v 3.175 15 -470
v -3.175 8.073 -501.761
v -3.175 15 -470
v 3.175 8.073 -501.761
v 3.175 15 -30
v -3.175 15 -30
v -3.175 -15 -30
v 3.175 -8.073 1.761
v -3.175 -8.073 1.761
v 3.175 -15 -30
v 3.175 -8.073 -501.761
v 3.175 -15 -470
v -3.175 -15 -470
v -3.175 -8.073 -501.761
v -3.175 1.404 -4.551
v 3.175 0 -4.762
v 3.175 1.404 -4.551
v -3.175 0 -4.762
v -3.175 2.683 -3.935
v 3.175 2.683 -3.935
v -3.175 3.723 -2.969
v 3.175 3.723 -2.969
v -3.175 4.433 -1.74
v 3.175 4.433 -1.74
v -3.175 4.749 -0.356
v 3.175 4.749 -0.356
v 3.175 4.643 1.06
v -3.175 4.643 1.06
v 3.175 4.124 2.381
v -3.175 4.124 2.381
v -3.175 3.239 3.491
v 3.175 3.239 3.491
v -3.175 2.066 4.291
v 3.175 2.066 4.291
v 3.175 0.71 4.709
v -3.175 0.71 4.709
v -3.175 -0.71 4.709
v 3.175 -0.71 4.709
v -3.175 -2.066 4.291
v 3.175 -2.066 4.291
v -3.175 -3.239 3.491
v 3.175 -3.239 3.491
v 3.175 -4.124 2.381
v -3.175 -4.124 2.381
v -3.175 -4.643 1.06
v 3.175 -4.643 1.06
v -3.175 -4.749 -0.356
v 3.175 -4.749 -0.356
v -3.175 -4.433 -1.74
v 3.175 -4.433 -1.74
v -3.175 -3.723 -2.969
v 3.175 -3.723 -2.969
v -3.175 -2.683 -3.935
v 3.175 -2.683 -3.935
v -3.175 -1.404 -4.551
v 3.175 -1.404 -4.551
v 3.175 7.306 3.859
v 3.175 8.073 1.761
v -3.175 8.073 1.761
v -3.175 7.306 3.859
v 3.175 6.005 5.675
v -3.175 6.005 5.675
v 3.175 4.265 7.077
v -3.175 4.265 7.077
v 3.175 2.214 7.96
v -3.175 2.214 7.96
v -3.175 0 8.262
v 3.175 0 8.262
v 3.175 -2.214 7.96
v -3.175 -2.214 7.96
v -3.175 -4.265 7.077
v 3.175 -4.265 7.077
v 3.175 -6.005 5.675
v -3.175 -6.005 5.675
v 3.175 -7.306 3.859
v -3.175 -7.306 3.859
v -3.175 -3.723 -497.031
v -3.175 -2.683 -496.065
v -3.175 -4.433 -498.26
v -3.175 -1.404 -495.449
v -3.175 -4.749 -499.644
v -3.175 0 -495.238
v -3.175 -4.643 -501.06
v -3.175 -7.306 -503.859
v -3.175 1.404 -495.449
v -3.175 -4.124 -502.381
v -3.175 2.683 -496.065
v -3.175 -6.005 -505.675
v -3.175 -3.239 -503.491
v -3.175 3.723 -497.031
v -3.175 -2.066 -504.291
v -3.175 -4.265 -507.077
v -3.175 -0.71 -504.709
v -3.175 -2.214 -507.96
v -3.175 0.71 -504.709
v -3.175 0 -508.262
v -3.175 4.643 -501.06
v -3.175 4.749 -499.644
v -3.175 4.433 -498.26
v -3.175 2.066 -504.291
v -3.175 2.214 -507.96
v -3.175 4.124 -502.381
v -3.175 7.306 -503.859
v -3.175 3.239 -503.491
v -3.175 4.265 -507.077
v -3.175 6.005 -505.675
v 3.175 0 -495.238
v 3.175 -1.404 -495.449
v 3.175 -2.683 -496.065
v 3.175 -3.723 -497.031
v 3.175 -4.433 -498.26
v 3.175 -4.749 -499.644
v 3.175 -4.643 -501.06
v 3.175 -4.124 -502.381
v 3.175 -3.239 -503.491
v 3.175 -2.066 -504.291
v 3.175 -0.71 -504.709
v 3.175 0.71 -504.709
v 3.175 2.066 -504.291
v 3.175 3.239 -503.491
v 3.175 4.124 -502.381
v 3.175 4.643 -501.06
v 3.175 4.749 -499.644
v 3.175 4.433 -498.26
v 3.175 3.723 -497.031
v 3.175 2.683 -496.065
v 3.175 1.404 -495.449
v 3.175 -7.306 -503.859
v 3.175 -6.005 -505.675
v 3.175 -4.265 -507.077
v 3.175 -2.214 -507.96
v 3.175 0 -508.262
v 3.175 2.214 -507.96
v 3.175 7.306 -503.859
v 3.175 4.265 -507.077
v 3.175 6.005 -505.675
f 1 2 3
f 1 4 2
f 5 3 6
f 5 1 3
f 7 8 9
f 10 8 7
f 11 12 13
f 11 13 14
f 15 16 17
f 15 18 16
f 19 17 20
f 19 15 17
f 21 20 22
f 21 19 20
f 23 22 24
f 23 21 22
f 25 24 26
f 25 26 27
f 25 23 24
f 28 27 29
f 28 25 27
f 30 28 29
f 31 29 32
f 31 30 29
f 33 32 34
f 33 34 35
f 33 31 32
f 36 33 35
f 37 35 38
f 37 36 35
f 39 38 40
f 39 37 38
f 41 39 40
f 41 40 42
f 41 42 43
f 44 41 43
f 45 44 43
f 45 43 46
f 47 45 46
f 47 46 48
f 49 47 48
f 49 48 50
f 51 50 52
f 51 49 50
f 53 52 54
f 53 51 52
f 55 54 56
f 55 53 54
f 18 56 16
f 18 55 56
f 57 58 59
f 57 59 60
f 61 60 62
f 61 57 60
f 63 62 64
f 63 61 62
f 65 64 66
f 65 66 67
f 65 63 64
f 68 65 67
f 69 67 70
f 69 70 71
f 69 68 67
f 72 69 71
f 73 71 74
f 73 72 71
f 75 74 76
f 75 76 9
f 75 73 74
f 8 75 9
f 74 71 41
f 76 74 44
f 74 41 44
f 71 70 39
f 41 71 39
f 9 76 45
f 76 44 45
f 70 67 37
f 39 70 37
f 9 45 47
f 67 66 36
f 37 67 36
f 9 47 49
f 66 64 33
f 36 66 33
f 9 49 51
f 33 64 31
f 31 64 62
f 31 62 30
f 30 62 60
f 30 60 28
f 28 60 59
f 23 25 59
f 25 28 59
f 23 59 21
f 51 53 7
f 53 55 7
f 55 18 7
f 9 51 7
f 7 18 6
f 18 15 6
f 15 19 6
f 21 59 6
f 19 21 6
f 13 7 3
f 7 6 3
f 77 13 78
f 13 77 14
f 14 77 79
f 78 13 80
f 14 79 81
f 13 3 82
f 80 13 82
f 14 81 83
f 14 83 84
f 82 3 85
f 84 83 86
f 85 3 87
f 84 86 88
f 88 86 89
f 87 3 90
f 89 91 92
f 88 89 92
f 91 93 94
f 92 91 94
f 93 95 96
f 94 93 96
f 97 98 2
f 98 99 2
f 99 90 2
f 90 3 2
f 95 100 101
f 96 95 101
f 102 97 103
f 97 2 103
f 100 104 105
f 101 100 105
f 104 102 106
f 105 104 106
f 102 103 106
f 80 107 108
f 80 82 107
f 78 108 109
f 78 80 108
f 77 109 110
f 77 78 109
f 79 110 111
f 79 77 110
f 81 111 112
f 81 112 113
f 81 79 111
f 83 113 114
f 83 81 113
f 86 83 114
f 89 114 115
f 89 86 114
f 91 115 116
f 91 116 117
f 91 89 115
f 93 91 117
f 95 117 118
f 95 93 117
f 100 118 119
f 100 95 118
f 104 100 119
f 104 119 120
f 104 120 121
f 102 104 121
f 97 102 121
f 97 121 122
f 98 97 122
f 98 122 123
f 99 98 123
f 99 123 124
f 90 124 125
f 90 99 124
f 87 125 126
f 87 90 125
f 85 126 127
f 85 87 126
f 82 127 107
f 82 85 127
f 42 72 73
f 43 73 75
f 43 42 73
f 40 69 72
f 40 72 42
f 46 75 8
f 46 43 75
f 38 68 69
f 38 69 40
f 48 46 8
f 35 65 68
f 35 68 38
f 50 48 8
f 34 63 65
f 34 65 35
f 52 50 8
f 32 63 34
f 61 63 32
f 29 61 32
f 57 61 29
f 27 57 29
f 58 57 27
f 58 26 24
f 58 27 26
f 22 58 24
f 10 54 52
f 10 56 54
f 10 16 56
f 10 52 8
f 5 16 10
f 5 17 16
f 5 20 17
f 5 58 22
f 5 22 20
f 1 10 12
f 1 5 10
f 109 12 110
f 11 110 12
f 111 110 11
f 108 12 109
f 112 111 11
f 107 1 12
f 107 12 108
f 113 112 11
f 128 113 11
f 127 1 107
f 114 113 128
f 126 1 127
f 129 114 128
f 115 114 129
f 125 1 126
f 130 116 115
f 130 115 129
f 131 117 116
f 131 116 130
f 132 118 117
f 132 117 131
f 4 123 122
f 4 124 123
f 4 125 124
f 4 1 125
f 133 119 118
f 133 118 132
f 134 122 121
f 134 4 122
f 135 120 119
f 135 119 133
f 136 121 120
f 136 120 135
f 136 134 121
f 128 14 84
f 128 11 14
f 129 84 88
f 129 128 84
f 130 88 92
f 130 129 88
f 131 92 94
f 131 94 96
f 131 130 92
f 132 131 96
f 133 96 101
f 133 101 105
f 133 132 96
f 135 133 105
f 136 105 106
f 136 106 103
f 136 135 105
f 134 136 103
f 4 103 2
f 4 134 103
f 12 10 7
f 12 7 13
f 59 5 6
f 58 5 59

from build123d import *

# Parameters (mm, degrees)
SKETCH1_R           = 4.7625
BOSS_EXTRUDE1_DEPTH = 3.175


with BuildPart() as part:
    # Sketch1 → Boss-Extrude1 (new, symmetric)
    with BuildSketch(Plane(origin=(0, 0, 0), x_dir=(0, 0, -1), z_dir=(1, 0, 0))):
        with BuildLine():
            Line((30, 15), (-1.760727799, 8.072716015))
            ThreePointArc((-1.760727799, 8.072716015), (-8.2625, 0), (-1.760727799, -8.072716015))
            Line((-1.760727799, -8.072716015), (30, -15))
            Line((30, -15), (470, -15))
            Line((470, -15), (501.760727799, -8.072716015))
            ThreePointArc((501.760727799, -8.072716015), (508.2625, 0), (501.760727799, 8.072716015))
            Line((501.760727799, 8.072716015), (470, 15))
            Line((470, 15), (30, 15))
        make_face()
        Circle(SKETCH1_R, mode=Mode.SUBTRACT)
        with Locations(Location((500, 0, 0), (0, 0, 180))):
            Circle(SKETCH1_R, mode=Mode.SUBTRACT)
    extrude(amount=BOSS_EXTRUDE1_DEPTH, both=True)


solid = part.part
